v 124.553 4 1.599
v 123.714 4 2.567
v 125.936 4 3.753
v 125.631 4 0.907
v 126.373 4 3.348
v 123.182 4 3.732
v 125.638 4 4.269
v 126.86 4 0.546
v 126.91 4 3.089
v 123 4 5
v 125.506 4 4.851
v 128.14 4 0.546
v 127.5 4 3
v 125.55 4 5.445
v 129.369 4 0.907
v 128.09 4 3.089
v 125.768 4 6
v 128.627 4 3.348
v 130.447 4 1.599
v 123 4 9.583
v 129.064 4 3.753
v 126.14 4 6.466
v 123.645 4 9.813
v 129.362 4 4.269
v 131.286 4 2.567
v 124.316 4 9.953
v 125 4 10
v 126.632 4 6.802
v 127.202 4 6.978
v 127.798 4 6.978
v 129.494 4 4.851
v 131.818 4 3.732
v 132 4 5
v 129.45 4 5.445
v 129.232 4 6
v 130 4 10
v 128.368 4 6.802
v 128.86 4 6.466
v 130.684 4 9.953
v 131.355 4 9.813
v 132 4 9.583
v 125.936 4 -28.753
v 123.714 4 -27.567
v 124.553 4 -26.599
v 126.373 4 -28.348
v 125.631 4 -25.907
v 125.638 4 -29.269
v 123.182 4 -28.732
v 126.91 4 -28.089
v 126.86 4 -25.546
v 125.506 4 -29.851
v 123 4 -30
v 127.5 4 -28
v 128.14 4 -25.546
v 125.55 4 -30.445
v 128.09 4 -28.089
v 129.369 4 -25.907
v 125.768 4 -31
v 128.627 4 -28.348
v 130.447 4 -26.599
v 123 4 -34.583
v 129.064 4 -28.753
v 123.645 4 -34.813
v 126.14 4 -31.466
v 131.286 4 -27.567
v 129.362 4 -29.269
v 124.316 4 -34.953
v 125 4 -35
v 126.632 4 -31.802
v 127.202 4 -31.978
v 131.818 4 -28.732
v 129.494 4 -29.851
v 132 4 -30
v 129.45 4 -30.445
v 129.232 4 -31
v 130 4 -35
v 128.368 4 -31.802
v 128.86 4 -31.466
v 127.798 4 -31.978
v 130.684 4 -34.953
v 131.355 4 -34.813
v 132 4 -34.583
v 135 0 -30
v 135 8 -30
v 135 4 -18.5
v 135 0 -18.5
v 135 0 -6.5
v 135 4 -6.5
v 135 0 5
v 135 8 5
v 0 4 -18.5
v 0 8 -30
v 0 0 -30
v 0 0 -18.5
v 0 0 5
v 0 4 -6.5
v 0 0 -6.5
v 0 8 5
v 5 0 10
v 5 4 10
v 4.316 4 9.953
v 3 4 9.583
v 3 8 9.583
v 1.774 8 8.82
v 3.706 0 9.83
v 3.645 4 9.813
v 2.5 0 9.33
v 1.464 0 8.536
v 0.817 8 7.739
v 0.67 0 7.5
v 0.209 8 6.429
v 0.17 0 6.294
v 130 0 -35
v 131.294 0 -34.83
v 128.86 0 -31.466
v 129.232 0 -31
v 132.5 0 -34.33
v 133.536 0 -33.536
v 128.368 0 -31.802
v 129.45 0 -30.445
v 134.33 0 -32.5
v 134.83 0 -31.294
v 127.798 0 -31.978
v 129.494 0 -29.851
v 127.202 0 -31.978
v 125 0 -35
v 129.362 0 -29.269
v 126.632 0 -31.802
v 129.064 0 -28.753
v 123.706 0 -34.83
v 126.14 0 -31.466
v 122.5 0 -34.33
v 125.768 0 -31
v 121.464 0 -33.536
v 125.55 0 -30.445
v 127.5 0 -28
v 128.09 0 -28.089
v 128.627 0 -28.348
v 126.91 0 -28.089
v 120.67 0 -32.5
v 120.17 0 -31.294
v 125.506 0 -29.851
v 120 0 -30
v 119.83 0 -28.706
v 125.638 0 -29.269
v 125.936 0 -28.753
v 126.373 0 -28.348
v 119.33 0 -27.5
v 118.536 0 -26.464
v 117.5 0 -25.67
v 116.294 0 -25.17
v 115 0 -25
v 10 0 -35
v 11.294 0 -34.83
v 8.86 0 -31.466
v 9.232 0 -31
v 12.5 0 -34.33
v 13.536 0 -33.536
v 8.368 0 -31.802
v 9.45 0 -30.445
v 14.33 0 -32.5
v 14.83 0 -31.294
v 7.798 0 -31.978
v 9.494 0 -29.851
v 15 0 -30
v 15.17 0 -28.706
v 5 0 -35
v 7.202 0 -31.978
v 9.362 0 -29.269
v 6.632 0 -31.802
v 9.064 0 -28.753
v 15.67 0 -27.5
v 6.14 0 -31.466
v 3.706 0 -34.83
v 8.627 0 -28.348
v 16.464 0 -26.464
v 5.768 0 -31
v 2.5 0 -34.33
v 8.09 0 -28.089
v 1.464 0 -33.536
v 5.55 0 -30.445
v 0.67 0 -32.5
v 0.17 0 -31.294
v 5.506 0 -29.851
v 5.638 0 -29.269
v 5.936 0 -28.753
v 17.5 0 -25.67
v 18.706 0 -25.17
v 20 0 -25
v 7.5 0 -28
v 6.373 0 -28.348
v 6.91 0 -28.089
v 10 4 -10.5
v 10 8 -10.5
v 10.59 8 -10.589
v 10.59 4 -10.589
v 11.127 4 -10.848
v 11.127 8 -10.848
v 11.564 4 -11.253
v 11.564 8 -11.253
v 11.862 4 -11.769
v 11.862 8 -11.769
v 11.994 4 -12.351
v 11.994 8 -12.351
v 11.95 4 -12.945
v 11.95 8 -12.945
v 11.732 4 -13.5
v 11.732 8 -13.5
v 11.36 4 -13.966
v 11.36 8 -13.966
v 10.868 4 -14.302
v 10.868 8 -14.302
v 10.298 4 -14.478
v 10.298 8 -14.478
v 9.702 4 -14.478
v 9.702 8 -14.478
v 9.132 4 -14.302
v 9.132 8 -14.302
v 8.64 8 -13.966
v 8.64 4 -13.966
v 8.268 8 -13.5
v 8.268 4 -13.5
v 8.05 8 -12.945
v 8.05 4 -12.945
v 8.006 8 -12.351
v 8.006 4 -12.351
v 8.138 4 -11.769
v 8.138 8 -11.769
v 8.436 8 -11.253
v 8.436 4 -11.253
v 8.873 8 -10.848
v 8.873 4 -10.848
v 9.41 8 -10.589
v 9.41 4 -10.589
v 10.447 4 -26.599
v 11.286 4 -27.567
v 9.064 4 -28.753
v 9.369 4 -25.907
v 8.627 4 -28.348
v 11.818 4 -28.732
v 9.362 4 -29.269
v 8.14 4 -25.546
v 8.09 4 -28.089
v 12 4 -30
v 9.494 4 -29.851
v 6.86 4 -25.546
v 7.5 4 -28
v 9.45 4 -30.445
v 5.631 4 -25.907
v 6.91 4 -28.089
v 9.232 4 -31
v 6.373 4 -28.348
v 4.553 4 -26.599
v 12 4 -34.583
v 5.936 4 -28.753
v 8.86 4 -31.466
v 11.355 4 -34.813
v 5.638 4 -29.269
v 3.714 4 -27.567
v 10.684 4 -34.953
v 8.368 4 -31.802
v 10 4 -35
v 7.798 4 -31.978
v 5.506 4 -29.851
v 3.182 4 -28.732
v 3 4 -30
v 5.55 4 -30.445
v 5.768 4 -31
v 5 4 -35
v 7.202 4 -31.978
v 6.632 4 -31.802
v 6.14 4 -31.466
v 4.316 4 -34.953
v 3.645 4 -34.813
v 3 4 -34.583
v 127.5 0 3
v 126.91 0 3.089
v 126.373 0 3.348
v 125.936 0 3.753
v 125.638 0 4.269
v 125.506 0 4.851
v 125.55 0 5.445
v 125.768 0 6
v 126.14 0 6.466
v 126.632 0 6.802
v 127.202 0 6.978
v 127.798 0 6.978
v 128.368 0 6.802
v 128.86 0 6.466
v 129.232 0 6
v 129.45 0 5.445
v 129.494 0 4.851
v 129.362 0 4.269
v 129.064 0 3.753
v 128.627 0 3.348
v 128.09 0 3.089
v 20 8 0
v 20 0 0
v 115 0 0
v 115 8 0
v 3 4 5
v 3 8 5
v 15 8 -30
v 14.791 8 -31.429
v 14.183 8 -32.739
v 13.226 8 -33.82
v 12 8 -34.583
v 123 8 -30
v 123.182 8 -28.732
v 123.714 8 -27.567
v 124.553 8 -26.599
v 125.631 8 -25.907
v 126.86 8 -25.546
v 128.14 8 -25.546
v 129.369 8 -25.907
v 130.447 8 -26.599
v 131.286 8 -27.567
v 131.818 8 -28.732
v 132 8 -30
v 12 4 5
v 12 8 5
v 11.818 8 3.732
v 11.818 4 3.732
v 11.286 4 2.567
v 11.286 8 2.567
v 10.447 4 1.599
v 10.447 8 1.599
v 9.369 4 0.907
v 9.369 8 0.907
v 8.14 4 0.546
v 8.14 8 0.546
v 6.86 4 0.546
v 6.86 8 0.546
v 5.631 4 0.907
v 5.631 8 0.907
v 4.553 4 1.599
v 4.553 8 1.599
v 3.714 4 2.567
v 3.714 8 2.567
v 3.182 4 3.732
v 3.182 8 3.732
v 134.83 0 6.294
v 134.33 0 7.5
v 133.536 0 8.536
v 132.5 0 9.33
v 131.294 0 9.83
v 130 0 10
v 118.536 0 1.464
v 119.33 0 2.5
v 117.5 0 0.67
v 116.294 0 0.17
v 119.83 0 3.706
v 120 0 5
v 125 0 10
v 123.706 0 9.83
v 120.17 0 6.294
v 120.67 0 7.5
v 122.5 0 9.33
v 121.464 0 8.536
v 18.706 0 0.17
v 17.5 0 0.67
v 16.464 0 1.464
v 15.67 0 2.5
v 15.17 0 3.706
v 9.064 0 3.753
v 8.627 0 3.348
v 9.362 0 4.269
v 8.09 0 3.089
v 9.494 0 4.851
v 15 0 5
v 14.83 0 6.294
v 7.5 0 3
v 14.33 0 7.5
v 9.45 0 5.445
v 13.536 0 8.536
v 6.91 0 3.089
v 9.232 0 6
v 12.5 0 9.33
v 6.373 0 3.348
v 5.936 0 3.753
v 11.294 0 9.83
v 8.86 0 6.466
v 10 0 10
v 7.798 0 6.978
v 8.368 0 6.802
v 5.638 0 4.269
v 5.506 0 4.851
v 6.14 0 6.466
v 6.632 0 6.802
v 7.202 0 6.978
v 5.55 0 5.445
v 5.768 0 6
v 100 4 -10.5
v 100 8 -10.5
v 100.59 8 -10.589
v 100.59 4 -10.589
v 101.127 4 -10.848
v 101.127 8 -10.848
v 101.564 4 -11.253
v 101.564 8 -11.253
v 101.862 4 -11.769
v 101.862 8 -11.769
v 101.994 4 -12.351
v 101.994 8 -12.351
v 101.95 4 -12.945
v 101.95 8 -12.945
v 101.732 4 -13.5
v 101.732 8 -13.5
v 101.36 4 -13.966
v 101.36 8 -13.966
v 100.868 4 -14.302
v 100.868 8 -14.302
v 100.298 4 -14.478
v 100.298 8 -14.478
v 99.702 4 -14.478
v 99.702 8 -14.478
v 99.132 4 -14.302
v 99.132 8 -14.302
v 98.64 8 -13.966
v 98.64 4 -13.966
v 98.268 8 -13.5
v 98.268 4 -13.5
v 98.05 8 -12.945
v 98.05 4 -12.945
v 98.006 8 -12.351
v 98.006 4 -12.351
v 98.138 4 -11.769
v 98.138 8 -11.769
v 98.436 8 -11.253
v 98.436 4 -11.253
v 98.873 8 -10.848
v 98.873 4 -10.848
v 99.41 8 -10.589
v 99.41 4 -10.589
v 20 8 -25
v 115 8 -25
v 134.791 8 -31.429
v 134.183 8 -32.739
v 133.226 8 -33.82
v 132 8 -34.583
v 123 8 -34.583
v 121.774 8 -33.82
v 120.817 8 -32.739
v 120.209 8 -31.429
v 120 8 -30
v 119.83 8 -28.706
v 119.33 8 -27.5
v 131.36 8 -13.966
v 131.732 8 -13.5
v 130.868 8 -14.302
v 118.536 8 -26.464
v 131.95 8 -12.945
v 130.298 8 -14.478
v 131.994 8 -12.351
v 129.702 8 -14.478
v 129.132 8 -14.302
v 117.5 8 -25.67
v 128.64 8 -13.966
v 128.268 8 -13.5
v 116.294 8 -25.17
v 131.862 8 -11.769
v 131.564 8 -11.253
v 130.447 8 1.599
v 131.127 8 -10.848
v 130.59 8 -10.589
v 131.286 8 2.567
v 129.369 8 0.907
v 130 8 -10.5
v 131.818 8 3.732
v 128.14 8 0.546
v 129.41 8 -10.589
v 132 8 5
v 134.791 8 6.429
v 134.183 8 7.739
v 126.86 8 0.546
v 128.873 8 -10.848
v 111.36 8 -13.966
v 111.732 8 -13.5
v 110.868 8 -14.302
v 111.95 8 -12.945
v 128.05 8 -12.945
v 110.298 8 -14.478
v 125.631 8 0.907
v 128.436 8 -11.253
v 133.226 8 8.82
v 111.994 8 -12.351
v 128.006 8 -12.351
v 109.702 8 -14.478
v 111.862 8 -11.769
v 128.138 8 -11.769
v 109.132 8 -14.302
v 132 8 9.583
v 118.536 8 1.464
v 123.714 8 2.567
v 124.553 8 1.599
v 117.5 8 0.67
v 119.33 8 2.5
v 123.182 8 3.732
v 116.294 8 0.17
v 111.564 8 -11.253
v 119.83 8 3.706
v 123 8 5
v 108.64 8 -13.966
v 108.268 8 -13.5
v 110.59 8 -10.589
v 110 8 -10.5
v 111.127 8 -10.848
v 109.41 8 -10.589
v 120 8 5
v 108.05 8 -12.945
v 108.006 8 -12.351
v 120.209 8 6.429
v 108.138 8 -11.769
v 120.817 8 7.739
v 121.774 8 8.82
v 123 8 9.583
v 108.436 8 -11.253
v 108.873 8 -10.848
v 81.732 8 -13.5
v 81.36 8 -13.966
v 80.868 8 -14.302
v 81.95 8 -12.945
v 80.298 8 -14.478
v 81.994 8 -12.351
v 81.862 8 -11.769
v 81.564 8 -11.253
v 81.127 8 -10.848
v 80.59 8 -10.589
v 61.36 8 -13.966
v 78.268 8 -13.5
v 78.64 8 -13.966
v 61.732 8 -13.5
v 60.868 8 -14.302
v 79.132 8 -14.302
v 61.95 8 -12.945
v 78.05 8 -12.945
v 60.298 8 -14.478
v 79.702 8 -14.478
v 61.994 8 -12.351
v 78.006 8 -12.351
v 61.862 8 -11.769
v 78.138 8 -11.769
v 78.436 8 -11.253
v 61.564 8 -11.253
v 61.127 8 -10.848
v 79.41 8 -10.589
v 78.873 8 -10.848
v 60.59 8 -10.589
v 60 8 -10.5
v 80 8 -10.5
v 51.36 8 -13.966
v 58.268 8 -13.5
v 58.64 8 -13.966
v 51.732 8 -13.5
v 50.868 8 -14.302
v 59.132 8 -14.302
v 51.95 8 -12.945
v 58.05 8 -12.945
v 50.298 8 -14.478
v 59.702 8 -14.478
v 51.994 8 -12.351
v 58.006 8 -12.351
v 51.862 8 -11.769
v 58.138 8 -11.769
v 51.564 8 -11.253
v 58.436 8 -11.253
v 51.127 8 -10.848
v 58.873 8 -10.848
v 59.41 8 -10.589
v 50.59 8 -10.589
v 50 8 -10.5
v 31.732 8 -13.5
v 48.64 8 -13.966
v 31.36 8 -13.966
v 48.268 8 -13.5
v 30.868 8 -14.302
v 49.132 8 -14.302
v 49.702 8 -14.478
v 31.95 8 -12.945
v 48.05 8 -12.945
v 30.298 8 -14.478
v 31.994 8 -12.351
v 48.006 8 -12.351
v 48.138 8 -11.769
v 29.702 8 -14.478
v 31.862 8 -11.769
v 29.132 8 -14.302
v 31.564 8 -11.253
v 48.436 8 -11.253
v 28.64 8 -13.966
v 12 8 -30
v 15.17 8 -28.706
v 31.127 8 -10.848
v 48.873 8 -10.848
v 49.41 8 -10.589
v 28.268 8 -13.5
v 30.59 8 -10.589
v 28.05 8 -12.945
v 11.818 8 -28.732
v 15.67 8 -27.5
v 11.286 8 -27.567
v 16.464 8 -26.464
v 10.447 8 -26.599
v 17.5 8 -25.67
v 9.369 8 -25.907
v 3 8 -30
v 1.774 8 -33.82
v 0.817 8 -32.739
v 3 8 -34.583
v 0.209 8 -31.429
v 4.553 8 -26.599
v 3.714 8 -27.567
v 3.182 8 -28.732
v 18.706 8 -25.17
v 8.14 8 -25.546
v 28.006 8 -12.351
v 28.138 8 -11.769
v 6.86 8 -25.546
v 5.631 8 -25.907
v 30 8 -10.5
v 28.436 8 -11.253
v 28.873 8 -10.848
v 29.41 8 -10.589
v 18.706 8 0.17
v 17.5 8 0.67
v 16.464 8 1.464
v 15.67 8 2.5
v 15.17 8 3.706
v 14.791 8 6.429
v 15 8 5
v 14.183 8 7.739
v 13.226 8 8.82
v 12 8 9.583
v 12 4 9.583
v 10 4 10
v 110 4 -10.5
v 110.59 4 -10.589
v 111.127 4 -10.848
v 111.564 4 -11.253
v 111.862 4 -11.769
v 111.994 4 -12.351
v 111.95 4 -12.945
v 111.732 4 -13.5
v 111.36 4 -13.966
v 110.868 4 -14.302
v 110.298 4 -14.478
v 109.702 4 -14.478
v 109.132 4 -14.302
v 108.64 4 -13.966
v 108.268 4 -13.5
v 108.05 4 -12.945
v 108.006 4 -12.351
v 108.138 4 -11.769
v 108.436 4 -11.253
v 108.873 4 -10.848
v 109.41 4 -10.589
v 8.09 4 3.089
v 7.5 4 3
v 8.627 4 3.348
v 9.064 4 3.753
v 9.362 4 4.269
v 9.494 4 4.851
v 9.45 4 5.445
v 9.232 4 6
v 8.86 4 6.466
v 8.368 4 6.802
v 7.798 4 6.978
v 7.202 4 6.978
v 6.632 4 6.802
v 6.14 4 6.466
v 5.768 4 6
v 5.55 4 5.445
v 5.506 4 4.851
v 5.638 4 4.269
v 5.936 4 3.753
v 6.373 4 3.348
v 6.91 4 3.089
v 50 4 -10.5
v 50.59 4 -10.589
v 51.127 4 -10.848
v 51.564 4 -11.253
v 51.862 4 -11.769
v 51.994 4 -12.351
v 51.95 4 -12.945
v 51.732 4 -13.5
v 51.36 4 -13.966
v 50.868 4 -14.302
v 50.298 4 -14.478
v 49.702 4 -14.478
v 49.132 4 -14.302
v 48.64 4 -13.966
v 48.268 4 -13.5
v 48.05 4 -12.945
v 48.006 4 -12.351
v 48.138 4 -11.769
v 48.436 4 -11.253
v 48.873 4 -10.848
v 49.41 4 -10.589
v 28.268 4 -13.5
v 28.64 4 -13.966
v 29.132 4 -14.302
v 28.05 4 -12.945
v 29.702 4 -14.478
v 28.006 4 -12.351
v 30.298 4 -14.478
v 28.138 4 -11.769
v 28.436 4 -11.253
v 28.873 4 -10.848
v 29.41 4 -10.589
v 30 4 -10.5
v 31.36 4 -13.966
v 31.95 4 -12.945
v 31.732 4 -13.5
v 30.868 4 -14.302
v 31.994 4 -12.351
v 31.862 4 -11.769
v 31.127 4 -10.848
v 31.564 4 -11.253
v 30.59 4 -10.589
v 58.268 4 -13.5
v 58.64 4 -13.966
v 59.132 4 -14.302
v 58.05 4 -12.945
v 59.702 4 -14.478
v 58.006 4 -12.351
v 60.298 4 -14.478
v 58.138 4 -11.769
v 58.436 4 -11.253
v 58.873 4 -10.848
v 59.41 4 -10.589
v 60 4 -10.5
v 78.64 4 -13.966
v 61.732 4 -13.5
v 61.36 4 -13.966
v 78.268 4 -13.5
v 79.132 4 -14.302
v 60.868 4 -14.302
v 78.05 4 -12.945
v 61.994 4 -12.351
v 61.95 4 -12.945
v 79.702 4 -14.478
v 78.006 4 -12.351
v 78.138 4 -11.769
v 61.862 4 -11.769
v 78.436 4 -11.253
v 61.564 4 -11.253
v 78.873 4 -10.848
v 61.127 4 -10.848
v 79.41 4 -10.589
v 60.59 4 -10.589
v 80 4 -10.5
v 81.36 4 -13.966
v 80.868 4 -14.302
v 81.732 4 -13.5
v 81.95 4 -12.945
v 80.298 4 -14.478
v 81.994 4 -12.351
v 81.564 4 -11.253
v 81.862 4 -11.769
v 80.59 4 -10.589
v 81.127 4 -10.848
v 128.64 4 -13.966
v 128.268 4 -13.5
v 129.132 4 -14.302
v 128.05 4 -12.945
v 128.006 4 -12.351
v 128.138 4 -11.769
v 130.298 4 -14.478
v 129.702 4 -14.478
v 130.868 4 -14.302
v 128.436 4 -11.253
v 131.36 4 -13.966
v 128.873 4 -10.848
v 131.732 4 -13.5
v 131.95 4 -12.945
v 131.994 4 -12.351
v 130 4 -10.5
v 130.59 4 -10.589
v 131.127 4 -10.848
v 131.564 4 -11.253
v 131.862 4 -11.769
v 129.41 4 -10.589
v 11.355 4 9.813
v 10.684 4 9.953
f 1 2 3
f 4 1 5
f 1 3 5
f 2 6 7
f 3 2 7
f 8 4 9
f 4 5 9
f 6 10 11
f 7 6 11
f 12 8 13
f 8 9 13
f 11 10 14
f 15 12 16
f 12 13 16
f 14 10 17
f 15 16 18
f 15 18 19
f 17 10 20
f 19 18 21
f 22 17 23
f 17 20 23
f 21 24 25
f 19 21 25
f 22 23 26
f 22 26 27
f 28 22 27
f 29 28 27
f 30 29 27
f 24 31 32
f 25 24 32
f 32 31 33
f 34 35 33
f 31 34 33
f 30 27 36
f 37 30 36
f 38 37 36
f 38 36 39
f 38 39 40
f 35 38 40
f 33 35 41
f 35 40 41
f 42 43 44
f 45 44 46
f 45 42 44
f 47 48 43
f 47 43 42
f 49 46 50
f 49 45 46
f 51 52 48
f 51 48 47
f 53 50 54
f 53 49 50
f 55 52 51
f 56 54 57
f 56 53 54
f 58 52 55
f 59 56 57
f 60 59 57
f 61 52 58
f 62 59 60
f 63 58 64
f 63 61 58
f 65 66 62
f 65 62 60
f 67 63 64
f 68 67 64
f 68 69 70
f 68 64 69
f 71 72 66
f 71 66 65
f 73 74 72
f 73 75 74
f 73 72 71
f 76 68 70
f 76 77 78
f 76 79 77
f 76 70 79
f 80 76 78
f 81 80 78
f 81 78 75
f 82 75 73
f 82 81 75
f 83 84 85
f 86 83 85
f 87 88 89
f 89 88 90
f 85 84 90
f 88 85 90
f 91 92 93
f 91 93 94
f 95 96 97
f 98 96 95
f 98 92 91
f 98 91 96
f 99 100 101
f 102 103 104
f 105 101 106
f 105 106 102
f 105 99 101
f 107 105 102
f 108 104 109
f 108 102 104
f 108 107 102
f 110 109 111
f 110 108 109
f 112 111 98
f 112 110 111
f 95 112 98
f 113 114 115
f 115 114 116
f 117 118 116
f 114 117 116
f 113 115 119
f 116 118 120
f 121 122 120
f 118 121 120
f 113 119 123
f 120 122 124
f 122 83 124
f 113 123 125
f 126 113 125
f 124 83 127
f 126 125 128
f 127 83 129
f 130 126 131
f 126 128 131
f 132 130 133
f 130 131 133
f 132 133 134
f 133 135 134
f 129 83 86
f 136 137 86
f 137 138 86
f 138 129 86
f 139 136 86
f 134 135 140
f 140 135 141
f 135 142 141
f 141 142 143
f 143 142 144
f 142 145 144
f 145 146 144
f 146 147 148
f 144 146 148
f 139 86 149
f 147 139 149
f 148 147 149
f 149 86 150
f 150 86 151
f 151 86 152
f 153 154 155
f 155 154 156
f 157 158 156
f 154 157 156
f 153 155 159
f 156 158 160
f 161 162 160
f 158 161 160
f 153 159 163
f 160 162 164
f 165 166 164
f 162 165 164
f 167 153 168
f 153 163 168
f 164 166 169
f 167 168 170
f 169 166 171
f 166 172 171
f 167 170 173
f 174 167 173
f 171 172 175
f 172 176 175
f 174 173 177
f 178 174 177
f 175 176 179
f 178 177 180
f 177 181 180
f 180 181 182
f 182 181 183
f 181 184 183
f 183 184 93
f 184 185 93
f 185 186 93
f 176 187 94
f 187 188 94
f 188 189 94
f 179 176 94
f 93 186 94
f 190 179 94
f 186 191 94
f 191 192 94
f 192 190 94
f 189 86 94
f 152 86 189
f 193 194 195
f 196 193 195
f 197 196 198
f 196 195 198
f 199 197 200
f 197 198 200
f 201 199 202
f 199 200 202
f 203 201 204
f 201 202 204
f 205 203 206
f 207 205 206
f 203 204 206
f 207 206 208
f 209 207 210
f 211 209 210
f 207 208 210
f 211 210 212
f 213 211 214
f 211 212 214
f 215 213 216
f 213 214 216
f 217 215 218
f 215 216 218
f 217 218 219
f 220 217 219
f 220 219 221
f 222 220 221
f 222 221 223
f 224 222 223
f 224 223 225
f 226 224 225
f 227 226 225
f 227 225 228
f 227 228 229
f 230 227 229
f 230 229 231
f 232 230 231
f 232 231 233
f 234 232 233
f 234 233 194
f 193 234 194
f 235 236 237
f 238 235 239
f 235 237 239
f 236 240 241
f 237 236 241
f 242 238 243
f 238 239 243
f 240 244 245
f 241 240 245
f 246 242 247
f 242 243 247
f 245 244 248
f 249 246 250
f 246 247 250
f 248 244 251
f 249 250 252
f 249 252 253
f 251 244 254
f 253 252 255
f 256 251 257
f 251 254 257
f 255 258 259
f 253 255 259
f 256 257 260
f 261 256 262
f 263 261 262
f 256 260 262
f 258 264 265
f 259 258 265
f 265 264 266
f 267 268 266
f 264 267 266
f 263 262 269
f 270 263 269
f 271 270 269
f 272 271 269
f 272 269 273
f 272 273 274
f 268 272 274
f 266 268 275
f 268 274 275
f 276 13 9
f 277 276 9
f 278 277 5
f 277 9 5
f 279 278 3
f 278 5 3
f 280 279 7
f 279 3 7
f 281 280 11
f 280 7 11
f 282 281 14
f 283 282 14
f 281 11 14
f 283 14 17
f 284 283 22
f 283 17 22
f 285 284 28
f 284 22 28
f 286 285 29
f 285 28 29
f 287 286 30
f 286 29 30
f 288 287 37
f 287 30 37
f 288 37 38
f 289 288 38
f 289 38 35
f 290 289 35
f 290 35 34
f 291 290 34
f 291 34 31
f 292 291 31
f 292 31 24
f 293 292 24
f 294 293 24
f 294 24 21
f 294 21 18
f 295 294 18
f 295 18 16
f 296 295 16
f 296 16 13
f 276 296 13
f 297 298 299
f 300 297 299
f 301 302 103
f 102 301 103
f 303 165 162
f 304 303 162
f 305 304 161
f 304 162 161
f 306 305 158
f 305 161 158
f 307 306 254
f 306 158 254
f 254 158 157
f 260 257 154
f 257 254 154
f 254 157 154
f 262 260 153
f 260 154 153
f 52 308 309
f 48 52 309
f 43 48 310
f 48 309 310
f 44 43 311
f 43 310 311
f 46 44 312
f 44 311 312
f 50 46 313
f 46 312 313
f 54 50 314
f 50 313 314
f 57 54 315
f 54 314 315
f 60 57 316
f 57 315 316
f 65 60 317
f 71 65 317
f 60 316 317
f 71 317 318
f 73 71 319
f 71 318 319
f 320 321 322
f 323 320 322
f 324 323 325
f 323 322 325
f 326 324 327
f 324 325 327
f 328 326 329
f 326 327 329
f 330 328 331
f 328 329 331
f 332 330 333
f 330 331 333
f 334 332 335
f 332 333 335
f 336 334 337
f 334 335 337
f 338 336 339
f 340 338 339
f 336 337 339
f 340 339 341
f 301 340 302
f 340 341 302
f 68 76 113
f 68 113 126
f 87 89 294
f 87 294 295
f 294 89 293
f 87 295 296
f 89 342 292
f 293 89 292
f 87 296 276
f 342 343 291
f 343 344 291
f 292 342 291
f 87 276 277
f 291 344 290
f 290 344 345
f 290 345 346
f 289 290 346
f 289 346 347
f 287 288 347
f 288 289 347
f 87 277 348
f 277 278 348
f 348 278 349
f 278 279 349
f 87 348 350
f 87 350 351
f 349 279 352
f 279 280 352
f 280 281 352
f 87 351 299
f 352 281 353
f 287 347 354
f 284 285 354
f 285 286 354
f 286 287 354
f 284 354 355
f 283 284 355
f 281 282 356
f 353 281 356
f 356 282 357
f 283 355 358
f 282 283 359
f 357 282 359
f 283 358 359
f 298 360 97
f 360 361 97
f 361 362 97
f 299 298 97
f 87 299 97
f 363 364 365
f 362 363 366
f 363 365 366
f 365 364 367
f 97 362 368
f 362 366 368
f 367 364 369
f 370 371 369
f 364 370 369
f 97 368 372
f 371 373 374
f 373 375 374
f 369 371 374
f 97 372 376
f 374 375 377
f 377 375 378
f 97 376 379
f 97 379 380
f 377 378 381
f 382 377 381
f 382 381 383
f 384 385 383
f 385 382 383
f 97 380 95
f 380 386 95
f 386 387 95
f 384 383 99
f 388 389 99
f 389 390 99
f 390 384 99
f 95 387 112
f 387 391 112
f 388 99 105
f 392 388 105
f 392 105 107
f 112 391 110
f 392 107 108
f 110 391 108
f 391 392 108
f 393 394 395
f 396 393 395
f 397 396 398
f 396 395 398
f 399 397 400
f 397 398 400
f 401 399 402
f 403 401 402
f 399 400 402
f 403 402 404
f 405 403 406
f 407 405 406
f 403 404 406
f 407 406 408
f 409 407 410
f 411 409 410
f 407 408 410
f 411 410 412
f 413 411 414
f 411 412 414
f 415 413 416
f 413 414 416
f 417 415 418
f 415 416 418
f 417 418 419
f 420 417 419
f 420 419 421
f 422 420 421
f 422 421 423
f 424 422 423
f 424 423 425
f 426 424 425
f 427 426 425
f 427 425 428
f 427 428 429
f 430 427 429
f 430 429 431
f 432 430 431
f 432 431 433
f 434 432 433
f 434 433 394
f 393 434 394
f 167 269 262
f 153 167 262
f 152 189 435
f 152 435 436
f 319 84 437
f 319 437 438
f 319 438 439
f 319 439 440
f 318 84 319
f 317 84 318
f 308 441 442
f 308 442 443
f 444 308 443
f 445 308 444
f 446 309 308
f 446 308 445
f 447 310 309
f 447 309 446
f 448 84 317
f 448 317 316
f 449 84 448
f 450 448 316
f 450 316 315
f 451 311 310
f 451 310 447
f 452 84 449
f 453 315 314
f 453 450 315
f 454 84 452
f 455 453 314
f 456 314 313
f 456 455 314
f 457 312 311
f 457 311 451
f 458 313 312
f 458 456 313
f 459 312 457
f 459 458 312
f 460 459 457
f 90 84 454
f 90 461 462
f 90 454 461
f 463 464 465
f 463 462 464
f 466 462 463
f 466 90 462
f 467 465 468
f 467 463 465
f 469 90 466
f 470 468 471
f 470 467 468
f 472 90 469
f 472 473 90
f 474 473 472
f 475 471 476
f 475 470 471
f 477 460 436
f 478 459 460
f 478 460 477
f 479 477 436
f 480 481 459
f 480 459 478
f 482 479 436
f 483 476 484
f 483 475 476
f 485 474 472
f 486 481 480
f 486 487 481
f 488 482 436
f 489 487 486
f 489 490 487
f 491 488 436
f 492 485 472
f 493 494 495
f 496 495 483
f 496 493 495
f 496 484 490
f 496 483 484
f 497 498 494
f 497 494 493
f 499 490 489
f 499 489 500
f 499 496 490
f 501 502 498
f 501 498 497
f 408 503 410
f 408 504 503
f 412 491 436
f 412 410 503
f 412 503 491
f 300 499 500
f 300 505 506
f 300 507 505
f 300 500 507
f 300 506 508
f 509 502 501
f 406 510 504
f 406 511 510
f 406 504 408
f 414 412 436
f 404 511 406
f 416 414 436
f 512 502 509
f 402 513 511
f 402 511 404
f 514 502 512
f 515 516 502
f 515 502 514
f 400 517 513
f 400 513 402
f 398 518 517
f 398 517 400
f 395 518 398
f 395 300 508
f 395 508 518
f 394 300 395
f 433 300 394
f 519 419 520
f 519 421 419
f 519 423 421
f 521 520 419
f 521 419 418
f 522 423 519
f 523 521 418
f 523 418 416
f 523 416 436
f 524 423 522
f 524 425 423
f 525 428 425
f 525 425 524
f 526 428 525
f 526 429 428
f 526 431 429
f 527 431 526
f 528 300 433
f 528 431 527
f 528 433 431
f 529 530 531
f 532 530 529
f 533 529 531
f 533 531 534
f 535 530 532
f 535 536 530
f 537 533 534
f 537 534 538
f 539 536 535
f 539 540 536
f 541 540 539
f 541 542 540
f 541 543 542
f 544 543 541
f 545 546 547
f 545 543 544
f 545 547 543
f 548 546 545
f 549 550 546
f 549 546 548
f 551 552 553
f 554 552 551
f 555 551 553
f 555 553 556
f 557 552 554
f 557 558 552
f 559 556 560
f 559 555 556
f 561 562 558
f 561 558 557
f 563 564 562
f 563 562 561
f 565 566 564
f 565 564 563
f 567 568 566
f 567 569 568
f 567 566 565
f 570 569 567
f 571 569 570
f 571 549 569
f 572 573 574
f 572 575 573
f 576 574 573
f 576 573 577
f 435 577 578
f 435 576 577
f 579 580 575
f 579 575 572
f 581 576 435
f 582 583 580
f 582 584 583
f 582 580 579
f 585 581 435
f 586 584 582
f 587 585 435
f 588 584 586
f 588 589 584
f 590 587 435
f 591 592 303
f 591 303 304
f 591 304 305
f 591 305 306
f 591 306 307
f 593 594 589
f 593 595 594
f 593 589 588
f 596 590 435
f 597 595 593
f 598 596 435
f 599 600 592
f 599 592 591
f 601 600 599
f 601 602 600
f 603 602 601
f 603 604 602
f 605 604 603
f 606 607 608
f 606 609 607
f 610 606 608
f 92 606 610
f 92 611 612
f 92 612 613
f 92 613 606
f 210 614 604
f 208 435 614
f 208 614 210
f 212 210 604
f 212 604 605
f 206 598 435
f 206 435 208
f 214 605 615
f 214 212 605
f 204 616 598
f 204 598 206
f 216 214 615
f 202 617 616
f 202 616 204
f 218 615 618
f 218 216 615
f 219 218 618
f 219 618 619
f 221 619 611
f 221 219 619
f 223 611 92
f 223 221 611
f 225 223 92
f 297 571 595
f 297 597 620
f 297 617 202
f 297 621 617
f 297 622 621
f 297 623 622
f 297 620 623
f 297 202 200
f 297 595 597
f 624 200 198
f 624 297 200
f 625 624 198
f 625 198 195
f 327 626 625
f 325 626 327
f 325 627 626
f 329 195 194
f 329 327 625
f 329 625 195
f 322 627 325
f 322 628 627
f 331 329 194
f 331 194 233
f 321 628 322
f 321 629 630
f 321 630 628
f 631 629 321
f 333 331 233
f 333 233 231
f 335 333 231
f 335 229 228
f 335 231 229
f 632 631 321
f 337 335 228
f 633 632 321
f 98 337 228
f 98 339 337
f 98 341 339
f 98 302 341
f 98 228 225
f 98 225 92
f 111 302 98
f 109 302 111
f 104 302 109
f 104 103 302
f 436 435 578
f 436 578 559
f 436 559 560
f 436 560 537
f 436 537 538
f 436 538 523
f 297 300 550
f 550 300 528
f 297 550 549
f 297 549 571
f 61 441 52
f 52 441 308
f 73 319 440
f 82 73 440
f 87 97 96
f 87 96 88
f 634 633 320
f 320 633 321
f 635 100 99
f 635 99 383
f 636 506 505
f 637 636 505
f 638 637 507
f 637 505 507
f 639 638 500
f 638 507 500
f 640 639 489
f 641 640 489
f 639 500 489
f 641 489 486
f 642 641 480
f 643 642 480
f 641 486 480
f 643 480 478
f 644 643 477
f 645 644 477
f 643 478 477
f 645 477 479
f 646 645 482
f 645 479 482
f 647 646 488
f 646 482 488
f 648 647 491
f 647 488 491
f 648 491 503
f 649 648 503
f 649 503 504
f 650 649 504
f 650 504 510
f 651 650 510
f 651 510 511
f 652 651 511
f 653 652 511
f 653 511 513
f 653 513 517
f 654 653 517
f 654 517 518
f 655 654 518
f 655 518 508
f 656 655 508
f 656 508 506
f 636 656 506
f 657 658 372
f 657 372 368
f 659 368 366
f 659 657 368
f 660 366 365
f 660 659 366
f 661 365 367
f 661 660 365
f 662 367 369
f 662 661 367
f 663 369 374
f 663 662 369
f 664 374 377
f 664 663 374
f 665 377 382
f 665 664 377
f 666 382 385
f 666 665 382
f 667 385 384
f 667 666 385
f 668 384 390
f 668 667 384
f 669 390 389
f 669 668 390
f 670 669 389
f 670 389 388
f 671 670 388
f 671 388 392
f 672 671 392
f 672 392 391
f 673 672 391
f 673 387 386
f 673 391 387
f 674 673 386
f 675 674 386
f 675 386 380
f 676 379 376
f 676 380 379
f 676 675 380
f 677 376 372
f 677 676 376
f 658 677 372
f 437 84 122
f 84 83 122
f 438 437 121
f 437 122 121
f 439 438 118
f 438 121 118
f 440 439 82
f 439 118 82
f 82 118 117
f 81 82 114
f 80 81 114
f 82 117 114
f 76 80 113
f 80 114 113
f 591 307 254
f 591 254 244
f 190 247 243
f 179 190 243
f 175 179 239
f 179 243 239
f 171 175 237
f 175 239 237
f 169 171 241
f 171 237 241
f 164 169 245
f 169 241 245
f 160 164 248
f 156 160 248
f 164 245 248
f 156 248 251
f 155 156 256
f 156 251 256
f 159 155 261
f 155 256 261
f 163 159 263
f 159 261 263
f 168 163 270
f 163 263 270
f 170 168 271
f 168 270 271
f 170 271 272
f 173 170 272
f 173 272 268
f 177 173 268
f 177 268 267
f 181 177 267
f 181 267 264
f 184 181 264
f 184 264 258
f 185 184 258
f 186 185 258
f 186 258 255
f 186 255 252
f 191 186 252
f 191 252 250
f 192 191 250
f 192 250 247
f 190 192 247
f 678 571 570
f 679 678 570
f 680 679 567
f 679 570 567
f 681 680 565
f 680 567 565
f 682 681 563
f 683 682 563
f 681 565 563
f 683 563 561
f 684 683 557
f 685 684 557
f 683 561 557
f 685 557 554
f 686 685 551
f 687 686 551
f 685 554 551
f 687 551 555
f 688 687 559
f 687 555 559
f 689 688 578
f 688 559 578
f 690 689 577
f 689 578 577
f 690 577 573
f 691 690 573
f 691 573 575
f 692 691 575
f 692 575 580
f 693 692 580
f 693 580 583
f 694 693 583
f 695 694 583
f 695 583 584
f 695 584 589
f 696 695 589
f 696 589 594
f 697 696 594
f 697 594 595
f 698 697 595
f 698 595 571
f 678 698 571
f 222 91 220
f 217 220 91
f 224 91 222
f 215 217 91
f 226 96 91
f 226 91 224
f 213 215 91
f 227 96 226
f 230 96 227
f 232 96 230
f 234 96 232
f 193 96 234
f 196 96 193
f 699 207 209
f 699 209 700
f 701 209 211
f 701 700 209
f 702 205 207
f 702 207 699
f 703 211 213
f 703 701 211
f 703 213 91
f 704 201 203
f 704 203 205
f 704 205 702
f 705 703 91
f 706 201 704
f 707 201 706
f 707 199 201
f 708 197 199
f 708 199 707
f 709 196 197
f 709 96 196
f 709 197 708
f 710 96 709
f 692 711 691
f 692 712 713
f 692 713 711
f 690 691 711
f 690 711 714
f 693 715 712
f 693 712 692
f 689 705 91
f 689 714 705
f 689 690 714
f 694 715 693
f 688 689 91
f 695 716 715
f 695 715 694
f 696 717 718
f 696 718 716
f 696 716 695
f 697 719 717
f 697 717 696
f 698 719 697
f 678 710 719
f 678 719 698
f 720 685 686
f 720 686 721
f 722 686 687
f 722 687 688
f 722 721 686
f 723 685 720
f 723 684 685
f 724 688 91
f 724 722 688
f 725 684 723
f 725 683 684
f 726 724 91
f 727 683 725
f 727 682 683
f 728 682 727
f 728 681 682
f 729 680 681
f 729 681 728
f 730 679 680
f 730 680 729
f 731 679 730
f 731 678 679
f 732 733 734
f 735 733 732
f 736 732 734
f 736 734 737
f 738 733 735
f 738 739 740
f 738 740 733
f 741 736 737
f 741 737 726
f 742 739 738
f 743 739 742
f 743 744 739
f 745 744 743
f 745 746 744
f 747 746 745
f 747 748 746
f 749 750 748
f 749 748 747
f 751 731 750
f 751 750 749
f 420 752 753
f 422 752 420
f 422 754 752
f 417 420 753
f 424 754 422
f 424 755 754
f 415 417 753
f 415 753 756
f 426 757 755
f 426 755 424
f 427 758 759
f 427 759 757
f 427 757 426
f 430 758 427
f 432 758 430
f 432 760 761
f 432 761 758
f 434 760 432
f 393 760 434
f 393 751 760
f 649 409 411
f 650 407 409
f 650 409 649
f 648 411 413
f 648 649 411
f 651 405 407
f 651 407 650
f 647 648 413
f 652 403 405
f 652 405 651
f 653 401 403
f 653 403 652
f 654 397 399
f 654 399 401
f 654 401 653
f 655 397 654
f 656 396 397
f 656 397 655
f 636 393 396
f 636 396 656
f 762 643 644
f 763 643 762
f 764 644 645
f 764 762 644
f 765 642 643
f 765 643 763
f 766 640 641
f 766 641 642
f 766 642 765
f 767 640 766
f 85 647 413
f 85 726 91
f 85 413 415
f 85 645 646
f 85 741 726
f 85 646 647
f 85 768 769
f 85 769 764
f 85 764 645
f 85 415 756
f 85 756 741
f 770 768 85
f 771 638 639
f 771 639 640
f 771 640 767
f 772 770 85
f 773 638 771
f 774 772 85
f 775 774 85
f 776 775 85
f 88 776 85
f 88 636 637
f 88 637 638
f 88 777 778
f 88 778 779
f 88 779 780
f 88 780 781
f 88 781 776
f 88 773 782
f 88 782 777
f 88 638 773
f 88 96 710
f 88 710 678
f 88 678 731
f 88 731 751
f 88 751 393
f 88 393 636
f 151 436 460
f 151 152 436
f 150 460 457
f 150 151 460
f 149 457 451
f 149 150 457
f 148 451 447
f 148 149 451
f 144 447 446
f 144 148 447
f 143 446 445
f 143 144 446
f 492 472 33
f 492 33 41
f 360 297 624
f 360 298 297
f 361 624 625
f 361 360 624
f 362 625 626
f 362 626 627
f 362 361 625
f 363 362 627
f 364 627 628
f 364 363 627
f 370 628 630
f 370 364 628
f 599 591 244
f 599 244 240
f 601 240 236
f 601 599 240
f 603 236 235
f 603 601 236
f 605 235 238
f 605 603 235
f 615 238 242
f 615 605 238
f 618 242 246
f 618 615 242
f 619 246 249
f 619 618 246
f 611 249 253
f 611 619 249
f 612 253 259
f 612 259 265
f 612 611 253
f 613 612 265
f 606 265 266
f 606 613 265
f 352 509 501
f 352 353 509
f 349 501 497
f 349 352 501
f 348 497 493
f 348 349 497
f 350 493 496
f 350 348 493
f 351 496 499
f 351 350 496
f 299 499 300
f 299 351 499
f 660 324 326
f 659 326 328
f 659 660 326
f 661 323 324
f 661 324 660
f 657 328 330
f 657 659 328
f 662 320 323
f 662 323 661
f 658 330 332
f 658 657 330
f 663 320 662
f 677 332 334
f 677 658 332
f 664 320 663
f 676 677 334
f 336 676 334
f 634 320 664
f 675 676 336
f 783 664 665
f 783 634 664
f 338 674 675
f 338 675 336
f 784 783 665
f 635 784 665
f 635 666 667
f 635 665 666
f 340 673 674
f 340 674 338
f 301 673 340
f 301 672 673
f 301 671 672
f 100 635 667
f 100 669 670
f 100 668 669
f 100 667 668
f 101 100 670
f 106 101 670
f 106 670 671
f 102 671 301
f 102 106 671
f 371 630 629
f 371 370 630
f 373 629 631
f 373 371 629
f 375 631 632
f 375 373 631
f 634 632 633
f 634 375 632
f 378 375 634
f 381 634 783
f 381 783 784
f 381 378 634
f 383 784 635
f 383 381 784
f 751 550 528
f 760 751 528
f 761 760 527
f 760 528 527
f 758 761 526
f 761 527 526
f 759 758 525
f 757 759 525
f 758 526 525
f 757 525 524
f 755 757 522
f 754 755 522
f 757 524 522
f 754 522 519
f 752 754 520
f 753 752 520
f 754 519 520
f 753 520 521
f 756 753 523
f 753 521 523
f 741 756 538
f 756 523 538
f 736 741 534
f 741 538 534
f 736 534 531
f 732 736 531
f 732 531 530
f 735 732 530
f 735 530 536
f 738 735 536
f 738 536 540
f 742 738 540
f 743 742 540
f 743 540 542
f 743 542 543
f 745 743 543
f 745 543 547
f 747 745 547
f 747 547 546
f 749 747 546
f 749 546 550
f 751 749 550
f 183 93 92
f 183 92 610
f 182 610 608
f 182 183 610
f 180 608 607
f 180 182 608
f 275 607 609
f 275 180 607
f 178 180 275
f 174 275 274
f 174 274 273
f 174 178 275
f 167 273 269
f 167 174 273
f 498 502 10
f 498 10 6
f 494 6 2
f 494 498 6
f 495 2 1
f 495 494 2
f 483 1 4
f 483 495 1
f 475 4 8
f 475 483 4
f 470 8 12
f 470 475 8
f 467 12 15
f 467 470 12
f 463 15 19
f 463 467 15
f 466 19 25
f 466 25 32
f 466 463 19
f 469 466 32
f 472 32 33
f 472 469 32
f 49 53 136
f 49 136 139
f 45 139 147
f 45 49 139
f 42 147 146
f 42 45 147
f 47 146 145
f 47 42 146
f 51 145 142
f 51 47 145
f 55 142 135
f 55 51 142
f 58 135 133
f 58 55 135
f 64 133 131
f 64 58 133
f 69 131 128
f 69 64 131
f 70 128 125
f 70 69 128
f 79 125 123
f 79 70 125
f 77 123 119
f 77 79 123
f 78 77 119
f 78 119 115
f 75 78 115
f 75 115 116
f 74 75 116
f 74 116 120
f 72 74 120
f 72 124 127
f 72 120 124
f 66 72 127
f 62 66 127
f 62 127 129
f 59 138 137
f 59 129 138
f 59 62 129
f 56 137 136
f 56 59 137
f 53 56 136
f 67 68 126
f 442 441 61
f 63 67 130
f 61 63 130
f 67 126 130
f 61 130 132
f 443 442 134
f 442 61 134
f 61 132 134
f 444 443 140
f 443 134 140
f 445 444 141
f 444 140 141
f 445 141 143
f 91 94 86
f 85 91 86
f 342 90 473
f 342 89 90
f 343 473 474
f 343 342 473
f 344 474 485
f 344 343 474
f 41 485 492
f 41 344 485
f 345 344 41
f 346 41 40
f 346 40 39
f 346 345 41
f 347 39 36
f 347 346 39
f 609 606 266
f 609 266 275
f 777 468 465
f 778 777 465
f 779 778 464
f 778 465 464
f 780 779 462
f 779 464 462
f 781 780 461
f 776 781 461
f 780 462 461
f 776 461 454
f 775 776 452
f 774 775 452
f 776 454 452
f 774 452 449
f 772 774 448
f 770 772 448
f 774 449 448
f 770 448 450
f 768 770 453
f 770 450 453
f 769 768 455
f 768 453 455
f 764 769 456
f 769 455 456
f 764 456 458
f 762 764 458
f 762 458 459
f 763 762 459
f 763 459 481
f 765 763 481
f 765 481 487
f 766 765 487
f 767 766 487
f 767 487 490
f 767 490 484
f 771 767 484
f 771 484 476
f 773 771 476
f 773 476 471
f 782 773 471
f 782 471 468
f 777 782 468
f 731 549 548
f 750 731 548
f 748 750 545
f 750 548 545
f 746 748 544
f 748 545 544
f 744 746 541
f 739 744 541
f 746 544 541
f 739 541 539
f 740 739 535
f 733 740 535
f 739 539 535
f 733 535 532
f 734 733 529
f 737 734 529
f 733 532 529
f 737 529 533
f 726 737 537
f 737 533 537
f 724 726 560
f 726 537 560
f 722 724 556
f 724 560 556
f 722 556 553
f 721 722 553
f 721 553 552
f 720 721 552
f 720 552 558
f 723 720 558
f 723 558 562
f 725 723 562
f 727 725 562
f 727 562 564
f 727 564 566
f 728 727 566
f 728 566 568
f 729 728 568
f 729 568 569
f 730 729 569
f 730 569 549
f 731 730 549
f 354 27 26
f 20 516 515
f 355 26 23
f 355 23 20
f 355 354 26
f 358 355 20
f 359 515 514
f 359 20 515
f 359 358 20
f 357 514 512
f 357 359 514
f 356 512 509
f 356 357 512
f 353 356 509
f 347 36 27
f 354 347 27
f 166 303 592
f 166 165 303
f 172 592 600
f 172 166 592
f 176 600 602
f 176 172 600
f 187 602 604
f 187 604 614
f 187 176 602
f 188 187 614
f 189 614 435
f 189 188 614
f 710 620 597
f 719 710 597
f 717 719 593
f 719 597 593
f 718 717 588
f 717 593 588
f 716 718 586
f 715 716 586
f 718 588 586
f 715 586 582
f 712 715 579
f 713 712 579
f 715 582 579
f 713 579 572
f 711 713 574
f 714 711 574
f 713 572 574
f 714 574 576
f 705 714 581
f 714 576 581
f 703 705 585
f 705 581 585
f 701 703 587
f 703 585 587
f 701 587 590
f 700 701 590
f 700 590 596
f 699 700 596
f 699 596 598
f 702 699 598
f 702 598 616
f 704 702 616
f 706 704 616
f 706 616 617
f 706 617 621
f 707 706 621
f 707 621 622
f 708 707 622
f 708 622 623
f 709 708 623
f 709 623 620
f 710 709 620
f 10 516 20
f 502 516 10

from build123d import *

# Parameters (mm, degrees)
SKETCH1_W                                  = 135
SKETCH1_H                                  = 25
BOSS_EXTRUDE1_DEPTH                        = 8
SKETCH2_W                                  = 15
SKETCH2_H                                  = 10
BOSS_EXTRUDE2_DEPTH                        = 8
FILLET1_R                                  = 5
SKETCH3_R                                  = 2
CUT_EXTRUDE1_DEPTH                         = 10
CUT_EXTRUDE2_DEPTH                         = 4
MIRROR3_AT_THE_SECOND_PLANE_COPY_1_SKETC_W = 15
MIRROR3_AT_THE_SECOND_PLANE_COPY_1_SKETC_H = 10
MIRROR3_AT_THE_SECOND_PLANE_COPY_1_DEPTH   = 8
MIRROR3_AT_THE_SECOND_PLANE_COPY_2_SKETC_R = 2
MIRROR3_AT_THE_SECOND_PLANE_COPY_2_DEPTH   = 10
MIRROR3_AT_THE_SECOND_PLANE_COPY_3_DEPTH   = 4
FILLET2_R                                  = 5
SKETCH5_R                                  = 2
CUT_EXTRUDE3_DEPTH                         = 10
SKETCH6_W                                  = 135
SKETCH6_H                                  = 12
CUT_EXTRUDE4_DEPTH                         = 4


with BuildPart() as part:
    # Sketch1 → Boss-Extrude1 (new body)
    with BuildSketch(Plane(origin=(0, 0, 0), x_dir=(1, 0, 0), z_dir=(0, 1, 0))):
        with Locations((67.5, 12.5)):
            Rectangle(SKETCH1_W, SKETCH1_H)
    extrude(amount=BOSS_EXTRUDE1_DEPTH)

    # Sketch2 → Boss-Extrude2 (add)
    with BuildSketch(Plane(origin=(0, 8, 0), x_dir=(1, 0, 0), z_dir=(0, 1, 0))):
        with Locations((7.5, 30)):
            Rectangle(SKETCH2_W, SKETCH2_H)
    boss_extrude2 = extrude(amount=-BOSS_EXTRUDE2_DEPTH)

    # Fillet1
    fillet1_edges = [part.edges().sort_by_distance(p)[0] for p in [
        (0, 4, -35),
        (15, 4, -35),
    ]]
    fillet(fillet1_edges, radius=FILLET1_R)

    # Sketch3 → Cut-Extrude1 (cut)
    with BuildSketch(Plane(origin=(0, 8, 0), x_dir=(1, 0, 0), z_dir=(0, 1, 0))):
        with Locations(Location((7.5, 30, 0), (0, 0, 270))):
            Circle(SKETCH3_R)
    cut_extrude1 = extrude(amount=-CUT_EXTRUDE1_DEPTH, mode=Mode.SUBTRACT)

    # Sketch4 → Cut-Extrude2 (cut)
    with BuildSketch(Plane(origin=(0, 8, 0), x_dir=(1, 0, 0), z_dir=(0, 1, 0))):
        with BuildLine():
            Line((3, 30), (3, 34.582575695))
            Line((3, 34.582575695), (3.751281218, 37.139462948))
            Line((3.751281218, 37.139462948), (12, 36.532200332))
            Line((12, 36.532200332), (12, 30))
            ThreePointArc((12, 30), (7.5, 25.5), (3, 30))
        make_face()
    cut_extrude2 = extrude(amount=-CUT_EXTRUDE2_DEPTH, mode=Mode.SUBTRACT)

    # Mirror3: Boss-Extrude2, Cut-Extrude1, Cut-Extrude2 across plane
    add(boss_extrude2.mirror(Plane.XY.offset(-12.5)))
    add(cut_extrude1.mirror(Plane.XY.offset(-12.5)), mode=Mode.SUBTRACT)
    add(cut_extrude2.mirror(Plane.XY.offset(-12.5)), mode=Mode.SUBTRACT)

    # Mirror3 at the second plane: Boss-Extrude2, Cut-Extrude1, Cut-Extrude2 across plane
    add(boss_extrude2.mirror(Plane.ZY.offset(-67.5)))
    add(cut_extrude1.mirror(Plane.ZY.offset(-67.5)), mode=Mode.SUBTRACT)
    add(cut_extrude2.mirror(Plane.ZY.offset(-67.5)), mode=Mode.SUBTRACT)

    # Mirror3 at the second plane copy 1 sketc → Mirror3 at the second plane copy 1 (add)
    with BuildSketch(Plane(origin=(135, 8, -25), x_dir=(-1, 0, 0), z_dir=(0, 1, 0))):
        with Locations((7.5, 30)):
            Rectangle(MIRROR3_AT_THE_SECOND_PLANE_COPY_1_SKETC_W, MIRROR3_AT_THE_SECOND_PLANE_COPY_1_SKETC_H)
    extrude(amount=-MIRROR3_AT_THE_SECOND_PLANE_COPY_1_DEPTH)

    # Mirror3 at the second plane copy 2 sketc → Mirror3 at the second plane copy 2 (cut)
    with BuildSketch(Plane(origin=(135, 8, -25), x_dir=(-1, 0, 0), z_dir=(0, 1, 0))):
        with Locations(Location((7.5, 30, 0), (0, 0, 270))):
            Circle(MIRROR3_AT_THE_SECOND_PLANE_COPY_2_SKETC_R)
    extrude(amount=-MIRROR3_AT_THE_SECOND_PLANE_COPY_2_DEPTH, mode=Mode.SUBTRACT)

    # Mirror3 at the second plane copy 3 sketc → Mirror3 at the second plane copy 3 (cut)
    with BuildSketch(Plane(origin=(135, 8, -25), x_dir=(-1, 0, 0), z_dir=(0, 1, 0))):
        with BuildLine():
            Line((3, 30), (3, 34.582575695))
            Line((3, 34.582575695), (3.751281218, 37.139462948))
            Line((3.751281218, 37.139462948), (12, 36.532200332))
            Line((12, 36.532200332), (12, 30))
            ThreePointArc((12, 30), (7.5, 25.5), (3, 30))
        make_face()
    extrude(amount=-MIRROR3_AT_THE_SECOND_PLANE_COPY_3_DEPTH, mode=Mode.SUBTRACT)

    # Fillet2
    fillet2_edges = [part.edges().sort_by_distance(p)[0] for p in [
        (15, 4, -25),
        (120, 4, -35),
        (120, 4, -25),
        (135, 4, -35),
        (15, 4, 10),
        (15, 4, 0),
        (0, 4, 10),
        (135, 4, 10),
        (120, 4, 10),
        (120, 4, 0),
    ]]
    fillet(fillet2_edges, radius=FILLET2_R - 0.0001)  # a hair under: the kernel refuses the full size

    # Sketch5 → Cut-Extrude3 (cut)
    with BuildSketch(Plane(origin=(0, 8, 0), x_dir=(1, 0, 0), z_dir=(0, 1, 0))):
        with Locations(Location((10, 12.5, 0), (0, 0, 270))):
            Circle(SKETCH5_R)
        with Locations(Location((30, 12.5, 0), (0, 0, 270))):
            Circle(SKETCH5_R)
        with Locations(Location((50, 12.5, 0), (0, 0, 270))):
            Circle(SKETCH5_R)
        with Locations(Location((60, 12.5, 0), (0, 0, 270))):
            Circle(SKETCH5_R)
        with Locations(Location((80, 12.5, 0), (0, 0, 270))):
            Circle(SKETCH5_R)
        with Locations(Location((100, 12.5, 0), (0, 0, 270))):
            Circle(SKETCH5_R)
        with Locations(Location((110, 12.5, 0), (0, 0, 270))):
            Circle(SKETCH5_R)
        with Locations(Location((130, 12.5, 0), (0, 0, 270))):
            Circle(SKETCH5_R)
    extrude(amount=-CUT_EXTRUDE3_DEPTH, mode=Mode.SUBTRACT)

    # Sketch6 → Cut-Extrude4 (cut)
    with BuildSketch(Plane.XZ):
        with Locations((67.5, -12.5)):
            Rectangle(SKETCH6_W, SKETCH6_H)
    extrude(amount=-CUT_EXTRUDE4_DEPTH, mode=Mode.SUBTRACT)


solid = part.part
